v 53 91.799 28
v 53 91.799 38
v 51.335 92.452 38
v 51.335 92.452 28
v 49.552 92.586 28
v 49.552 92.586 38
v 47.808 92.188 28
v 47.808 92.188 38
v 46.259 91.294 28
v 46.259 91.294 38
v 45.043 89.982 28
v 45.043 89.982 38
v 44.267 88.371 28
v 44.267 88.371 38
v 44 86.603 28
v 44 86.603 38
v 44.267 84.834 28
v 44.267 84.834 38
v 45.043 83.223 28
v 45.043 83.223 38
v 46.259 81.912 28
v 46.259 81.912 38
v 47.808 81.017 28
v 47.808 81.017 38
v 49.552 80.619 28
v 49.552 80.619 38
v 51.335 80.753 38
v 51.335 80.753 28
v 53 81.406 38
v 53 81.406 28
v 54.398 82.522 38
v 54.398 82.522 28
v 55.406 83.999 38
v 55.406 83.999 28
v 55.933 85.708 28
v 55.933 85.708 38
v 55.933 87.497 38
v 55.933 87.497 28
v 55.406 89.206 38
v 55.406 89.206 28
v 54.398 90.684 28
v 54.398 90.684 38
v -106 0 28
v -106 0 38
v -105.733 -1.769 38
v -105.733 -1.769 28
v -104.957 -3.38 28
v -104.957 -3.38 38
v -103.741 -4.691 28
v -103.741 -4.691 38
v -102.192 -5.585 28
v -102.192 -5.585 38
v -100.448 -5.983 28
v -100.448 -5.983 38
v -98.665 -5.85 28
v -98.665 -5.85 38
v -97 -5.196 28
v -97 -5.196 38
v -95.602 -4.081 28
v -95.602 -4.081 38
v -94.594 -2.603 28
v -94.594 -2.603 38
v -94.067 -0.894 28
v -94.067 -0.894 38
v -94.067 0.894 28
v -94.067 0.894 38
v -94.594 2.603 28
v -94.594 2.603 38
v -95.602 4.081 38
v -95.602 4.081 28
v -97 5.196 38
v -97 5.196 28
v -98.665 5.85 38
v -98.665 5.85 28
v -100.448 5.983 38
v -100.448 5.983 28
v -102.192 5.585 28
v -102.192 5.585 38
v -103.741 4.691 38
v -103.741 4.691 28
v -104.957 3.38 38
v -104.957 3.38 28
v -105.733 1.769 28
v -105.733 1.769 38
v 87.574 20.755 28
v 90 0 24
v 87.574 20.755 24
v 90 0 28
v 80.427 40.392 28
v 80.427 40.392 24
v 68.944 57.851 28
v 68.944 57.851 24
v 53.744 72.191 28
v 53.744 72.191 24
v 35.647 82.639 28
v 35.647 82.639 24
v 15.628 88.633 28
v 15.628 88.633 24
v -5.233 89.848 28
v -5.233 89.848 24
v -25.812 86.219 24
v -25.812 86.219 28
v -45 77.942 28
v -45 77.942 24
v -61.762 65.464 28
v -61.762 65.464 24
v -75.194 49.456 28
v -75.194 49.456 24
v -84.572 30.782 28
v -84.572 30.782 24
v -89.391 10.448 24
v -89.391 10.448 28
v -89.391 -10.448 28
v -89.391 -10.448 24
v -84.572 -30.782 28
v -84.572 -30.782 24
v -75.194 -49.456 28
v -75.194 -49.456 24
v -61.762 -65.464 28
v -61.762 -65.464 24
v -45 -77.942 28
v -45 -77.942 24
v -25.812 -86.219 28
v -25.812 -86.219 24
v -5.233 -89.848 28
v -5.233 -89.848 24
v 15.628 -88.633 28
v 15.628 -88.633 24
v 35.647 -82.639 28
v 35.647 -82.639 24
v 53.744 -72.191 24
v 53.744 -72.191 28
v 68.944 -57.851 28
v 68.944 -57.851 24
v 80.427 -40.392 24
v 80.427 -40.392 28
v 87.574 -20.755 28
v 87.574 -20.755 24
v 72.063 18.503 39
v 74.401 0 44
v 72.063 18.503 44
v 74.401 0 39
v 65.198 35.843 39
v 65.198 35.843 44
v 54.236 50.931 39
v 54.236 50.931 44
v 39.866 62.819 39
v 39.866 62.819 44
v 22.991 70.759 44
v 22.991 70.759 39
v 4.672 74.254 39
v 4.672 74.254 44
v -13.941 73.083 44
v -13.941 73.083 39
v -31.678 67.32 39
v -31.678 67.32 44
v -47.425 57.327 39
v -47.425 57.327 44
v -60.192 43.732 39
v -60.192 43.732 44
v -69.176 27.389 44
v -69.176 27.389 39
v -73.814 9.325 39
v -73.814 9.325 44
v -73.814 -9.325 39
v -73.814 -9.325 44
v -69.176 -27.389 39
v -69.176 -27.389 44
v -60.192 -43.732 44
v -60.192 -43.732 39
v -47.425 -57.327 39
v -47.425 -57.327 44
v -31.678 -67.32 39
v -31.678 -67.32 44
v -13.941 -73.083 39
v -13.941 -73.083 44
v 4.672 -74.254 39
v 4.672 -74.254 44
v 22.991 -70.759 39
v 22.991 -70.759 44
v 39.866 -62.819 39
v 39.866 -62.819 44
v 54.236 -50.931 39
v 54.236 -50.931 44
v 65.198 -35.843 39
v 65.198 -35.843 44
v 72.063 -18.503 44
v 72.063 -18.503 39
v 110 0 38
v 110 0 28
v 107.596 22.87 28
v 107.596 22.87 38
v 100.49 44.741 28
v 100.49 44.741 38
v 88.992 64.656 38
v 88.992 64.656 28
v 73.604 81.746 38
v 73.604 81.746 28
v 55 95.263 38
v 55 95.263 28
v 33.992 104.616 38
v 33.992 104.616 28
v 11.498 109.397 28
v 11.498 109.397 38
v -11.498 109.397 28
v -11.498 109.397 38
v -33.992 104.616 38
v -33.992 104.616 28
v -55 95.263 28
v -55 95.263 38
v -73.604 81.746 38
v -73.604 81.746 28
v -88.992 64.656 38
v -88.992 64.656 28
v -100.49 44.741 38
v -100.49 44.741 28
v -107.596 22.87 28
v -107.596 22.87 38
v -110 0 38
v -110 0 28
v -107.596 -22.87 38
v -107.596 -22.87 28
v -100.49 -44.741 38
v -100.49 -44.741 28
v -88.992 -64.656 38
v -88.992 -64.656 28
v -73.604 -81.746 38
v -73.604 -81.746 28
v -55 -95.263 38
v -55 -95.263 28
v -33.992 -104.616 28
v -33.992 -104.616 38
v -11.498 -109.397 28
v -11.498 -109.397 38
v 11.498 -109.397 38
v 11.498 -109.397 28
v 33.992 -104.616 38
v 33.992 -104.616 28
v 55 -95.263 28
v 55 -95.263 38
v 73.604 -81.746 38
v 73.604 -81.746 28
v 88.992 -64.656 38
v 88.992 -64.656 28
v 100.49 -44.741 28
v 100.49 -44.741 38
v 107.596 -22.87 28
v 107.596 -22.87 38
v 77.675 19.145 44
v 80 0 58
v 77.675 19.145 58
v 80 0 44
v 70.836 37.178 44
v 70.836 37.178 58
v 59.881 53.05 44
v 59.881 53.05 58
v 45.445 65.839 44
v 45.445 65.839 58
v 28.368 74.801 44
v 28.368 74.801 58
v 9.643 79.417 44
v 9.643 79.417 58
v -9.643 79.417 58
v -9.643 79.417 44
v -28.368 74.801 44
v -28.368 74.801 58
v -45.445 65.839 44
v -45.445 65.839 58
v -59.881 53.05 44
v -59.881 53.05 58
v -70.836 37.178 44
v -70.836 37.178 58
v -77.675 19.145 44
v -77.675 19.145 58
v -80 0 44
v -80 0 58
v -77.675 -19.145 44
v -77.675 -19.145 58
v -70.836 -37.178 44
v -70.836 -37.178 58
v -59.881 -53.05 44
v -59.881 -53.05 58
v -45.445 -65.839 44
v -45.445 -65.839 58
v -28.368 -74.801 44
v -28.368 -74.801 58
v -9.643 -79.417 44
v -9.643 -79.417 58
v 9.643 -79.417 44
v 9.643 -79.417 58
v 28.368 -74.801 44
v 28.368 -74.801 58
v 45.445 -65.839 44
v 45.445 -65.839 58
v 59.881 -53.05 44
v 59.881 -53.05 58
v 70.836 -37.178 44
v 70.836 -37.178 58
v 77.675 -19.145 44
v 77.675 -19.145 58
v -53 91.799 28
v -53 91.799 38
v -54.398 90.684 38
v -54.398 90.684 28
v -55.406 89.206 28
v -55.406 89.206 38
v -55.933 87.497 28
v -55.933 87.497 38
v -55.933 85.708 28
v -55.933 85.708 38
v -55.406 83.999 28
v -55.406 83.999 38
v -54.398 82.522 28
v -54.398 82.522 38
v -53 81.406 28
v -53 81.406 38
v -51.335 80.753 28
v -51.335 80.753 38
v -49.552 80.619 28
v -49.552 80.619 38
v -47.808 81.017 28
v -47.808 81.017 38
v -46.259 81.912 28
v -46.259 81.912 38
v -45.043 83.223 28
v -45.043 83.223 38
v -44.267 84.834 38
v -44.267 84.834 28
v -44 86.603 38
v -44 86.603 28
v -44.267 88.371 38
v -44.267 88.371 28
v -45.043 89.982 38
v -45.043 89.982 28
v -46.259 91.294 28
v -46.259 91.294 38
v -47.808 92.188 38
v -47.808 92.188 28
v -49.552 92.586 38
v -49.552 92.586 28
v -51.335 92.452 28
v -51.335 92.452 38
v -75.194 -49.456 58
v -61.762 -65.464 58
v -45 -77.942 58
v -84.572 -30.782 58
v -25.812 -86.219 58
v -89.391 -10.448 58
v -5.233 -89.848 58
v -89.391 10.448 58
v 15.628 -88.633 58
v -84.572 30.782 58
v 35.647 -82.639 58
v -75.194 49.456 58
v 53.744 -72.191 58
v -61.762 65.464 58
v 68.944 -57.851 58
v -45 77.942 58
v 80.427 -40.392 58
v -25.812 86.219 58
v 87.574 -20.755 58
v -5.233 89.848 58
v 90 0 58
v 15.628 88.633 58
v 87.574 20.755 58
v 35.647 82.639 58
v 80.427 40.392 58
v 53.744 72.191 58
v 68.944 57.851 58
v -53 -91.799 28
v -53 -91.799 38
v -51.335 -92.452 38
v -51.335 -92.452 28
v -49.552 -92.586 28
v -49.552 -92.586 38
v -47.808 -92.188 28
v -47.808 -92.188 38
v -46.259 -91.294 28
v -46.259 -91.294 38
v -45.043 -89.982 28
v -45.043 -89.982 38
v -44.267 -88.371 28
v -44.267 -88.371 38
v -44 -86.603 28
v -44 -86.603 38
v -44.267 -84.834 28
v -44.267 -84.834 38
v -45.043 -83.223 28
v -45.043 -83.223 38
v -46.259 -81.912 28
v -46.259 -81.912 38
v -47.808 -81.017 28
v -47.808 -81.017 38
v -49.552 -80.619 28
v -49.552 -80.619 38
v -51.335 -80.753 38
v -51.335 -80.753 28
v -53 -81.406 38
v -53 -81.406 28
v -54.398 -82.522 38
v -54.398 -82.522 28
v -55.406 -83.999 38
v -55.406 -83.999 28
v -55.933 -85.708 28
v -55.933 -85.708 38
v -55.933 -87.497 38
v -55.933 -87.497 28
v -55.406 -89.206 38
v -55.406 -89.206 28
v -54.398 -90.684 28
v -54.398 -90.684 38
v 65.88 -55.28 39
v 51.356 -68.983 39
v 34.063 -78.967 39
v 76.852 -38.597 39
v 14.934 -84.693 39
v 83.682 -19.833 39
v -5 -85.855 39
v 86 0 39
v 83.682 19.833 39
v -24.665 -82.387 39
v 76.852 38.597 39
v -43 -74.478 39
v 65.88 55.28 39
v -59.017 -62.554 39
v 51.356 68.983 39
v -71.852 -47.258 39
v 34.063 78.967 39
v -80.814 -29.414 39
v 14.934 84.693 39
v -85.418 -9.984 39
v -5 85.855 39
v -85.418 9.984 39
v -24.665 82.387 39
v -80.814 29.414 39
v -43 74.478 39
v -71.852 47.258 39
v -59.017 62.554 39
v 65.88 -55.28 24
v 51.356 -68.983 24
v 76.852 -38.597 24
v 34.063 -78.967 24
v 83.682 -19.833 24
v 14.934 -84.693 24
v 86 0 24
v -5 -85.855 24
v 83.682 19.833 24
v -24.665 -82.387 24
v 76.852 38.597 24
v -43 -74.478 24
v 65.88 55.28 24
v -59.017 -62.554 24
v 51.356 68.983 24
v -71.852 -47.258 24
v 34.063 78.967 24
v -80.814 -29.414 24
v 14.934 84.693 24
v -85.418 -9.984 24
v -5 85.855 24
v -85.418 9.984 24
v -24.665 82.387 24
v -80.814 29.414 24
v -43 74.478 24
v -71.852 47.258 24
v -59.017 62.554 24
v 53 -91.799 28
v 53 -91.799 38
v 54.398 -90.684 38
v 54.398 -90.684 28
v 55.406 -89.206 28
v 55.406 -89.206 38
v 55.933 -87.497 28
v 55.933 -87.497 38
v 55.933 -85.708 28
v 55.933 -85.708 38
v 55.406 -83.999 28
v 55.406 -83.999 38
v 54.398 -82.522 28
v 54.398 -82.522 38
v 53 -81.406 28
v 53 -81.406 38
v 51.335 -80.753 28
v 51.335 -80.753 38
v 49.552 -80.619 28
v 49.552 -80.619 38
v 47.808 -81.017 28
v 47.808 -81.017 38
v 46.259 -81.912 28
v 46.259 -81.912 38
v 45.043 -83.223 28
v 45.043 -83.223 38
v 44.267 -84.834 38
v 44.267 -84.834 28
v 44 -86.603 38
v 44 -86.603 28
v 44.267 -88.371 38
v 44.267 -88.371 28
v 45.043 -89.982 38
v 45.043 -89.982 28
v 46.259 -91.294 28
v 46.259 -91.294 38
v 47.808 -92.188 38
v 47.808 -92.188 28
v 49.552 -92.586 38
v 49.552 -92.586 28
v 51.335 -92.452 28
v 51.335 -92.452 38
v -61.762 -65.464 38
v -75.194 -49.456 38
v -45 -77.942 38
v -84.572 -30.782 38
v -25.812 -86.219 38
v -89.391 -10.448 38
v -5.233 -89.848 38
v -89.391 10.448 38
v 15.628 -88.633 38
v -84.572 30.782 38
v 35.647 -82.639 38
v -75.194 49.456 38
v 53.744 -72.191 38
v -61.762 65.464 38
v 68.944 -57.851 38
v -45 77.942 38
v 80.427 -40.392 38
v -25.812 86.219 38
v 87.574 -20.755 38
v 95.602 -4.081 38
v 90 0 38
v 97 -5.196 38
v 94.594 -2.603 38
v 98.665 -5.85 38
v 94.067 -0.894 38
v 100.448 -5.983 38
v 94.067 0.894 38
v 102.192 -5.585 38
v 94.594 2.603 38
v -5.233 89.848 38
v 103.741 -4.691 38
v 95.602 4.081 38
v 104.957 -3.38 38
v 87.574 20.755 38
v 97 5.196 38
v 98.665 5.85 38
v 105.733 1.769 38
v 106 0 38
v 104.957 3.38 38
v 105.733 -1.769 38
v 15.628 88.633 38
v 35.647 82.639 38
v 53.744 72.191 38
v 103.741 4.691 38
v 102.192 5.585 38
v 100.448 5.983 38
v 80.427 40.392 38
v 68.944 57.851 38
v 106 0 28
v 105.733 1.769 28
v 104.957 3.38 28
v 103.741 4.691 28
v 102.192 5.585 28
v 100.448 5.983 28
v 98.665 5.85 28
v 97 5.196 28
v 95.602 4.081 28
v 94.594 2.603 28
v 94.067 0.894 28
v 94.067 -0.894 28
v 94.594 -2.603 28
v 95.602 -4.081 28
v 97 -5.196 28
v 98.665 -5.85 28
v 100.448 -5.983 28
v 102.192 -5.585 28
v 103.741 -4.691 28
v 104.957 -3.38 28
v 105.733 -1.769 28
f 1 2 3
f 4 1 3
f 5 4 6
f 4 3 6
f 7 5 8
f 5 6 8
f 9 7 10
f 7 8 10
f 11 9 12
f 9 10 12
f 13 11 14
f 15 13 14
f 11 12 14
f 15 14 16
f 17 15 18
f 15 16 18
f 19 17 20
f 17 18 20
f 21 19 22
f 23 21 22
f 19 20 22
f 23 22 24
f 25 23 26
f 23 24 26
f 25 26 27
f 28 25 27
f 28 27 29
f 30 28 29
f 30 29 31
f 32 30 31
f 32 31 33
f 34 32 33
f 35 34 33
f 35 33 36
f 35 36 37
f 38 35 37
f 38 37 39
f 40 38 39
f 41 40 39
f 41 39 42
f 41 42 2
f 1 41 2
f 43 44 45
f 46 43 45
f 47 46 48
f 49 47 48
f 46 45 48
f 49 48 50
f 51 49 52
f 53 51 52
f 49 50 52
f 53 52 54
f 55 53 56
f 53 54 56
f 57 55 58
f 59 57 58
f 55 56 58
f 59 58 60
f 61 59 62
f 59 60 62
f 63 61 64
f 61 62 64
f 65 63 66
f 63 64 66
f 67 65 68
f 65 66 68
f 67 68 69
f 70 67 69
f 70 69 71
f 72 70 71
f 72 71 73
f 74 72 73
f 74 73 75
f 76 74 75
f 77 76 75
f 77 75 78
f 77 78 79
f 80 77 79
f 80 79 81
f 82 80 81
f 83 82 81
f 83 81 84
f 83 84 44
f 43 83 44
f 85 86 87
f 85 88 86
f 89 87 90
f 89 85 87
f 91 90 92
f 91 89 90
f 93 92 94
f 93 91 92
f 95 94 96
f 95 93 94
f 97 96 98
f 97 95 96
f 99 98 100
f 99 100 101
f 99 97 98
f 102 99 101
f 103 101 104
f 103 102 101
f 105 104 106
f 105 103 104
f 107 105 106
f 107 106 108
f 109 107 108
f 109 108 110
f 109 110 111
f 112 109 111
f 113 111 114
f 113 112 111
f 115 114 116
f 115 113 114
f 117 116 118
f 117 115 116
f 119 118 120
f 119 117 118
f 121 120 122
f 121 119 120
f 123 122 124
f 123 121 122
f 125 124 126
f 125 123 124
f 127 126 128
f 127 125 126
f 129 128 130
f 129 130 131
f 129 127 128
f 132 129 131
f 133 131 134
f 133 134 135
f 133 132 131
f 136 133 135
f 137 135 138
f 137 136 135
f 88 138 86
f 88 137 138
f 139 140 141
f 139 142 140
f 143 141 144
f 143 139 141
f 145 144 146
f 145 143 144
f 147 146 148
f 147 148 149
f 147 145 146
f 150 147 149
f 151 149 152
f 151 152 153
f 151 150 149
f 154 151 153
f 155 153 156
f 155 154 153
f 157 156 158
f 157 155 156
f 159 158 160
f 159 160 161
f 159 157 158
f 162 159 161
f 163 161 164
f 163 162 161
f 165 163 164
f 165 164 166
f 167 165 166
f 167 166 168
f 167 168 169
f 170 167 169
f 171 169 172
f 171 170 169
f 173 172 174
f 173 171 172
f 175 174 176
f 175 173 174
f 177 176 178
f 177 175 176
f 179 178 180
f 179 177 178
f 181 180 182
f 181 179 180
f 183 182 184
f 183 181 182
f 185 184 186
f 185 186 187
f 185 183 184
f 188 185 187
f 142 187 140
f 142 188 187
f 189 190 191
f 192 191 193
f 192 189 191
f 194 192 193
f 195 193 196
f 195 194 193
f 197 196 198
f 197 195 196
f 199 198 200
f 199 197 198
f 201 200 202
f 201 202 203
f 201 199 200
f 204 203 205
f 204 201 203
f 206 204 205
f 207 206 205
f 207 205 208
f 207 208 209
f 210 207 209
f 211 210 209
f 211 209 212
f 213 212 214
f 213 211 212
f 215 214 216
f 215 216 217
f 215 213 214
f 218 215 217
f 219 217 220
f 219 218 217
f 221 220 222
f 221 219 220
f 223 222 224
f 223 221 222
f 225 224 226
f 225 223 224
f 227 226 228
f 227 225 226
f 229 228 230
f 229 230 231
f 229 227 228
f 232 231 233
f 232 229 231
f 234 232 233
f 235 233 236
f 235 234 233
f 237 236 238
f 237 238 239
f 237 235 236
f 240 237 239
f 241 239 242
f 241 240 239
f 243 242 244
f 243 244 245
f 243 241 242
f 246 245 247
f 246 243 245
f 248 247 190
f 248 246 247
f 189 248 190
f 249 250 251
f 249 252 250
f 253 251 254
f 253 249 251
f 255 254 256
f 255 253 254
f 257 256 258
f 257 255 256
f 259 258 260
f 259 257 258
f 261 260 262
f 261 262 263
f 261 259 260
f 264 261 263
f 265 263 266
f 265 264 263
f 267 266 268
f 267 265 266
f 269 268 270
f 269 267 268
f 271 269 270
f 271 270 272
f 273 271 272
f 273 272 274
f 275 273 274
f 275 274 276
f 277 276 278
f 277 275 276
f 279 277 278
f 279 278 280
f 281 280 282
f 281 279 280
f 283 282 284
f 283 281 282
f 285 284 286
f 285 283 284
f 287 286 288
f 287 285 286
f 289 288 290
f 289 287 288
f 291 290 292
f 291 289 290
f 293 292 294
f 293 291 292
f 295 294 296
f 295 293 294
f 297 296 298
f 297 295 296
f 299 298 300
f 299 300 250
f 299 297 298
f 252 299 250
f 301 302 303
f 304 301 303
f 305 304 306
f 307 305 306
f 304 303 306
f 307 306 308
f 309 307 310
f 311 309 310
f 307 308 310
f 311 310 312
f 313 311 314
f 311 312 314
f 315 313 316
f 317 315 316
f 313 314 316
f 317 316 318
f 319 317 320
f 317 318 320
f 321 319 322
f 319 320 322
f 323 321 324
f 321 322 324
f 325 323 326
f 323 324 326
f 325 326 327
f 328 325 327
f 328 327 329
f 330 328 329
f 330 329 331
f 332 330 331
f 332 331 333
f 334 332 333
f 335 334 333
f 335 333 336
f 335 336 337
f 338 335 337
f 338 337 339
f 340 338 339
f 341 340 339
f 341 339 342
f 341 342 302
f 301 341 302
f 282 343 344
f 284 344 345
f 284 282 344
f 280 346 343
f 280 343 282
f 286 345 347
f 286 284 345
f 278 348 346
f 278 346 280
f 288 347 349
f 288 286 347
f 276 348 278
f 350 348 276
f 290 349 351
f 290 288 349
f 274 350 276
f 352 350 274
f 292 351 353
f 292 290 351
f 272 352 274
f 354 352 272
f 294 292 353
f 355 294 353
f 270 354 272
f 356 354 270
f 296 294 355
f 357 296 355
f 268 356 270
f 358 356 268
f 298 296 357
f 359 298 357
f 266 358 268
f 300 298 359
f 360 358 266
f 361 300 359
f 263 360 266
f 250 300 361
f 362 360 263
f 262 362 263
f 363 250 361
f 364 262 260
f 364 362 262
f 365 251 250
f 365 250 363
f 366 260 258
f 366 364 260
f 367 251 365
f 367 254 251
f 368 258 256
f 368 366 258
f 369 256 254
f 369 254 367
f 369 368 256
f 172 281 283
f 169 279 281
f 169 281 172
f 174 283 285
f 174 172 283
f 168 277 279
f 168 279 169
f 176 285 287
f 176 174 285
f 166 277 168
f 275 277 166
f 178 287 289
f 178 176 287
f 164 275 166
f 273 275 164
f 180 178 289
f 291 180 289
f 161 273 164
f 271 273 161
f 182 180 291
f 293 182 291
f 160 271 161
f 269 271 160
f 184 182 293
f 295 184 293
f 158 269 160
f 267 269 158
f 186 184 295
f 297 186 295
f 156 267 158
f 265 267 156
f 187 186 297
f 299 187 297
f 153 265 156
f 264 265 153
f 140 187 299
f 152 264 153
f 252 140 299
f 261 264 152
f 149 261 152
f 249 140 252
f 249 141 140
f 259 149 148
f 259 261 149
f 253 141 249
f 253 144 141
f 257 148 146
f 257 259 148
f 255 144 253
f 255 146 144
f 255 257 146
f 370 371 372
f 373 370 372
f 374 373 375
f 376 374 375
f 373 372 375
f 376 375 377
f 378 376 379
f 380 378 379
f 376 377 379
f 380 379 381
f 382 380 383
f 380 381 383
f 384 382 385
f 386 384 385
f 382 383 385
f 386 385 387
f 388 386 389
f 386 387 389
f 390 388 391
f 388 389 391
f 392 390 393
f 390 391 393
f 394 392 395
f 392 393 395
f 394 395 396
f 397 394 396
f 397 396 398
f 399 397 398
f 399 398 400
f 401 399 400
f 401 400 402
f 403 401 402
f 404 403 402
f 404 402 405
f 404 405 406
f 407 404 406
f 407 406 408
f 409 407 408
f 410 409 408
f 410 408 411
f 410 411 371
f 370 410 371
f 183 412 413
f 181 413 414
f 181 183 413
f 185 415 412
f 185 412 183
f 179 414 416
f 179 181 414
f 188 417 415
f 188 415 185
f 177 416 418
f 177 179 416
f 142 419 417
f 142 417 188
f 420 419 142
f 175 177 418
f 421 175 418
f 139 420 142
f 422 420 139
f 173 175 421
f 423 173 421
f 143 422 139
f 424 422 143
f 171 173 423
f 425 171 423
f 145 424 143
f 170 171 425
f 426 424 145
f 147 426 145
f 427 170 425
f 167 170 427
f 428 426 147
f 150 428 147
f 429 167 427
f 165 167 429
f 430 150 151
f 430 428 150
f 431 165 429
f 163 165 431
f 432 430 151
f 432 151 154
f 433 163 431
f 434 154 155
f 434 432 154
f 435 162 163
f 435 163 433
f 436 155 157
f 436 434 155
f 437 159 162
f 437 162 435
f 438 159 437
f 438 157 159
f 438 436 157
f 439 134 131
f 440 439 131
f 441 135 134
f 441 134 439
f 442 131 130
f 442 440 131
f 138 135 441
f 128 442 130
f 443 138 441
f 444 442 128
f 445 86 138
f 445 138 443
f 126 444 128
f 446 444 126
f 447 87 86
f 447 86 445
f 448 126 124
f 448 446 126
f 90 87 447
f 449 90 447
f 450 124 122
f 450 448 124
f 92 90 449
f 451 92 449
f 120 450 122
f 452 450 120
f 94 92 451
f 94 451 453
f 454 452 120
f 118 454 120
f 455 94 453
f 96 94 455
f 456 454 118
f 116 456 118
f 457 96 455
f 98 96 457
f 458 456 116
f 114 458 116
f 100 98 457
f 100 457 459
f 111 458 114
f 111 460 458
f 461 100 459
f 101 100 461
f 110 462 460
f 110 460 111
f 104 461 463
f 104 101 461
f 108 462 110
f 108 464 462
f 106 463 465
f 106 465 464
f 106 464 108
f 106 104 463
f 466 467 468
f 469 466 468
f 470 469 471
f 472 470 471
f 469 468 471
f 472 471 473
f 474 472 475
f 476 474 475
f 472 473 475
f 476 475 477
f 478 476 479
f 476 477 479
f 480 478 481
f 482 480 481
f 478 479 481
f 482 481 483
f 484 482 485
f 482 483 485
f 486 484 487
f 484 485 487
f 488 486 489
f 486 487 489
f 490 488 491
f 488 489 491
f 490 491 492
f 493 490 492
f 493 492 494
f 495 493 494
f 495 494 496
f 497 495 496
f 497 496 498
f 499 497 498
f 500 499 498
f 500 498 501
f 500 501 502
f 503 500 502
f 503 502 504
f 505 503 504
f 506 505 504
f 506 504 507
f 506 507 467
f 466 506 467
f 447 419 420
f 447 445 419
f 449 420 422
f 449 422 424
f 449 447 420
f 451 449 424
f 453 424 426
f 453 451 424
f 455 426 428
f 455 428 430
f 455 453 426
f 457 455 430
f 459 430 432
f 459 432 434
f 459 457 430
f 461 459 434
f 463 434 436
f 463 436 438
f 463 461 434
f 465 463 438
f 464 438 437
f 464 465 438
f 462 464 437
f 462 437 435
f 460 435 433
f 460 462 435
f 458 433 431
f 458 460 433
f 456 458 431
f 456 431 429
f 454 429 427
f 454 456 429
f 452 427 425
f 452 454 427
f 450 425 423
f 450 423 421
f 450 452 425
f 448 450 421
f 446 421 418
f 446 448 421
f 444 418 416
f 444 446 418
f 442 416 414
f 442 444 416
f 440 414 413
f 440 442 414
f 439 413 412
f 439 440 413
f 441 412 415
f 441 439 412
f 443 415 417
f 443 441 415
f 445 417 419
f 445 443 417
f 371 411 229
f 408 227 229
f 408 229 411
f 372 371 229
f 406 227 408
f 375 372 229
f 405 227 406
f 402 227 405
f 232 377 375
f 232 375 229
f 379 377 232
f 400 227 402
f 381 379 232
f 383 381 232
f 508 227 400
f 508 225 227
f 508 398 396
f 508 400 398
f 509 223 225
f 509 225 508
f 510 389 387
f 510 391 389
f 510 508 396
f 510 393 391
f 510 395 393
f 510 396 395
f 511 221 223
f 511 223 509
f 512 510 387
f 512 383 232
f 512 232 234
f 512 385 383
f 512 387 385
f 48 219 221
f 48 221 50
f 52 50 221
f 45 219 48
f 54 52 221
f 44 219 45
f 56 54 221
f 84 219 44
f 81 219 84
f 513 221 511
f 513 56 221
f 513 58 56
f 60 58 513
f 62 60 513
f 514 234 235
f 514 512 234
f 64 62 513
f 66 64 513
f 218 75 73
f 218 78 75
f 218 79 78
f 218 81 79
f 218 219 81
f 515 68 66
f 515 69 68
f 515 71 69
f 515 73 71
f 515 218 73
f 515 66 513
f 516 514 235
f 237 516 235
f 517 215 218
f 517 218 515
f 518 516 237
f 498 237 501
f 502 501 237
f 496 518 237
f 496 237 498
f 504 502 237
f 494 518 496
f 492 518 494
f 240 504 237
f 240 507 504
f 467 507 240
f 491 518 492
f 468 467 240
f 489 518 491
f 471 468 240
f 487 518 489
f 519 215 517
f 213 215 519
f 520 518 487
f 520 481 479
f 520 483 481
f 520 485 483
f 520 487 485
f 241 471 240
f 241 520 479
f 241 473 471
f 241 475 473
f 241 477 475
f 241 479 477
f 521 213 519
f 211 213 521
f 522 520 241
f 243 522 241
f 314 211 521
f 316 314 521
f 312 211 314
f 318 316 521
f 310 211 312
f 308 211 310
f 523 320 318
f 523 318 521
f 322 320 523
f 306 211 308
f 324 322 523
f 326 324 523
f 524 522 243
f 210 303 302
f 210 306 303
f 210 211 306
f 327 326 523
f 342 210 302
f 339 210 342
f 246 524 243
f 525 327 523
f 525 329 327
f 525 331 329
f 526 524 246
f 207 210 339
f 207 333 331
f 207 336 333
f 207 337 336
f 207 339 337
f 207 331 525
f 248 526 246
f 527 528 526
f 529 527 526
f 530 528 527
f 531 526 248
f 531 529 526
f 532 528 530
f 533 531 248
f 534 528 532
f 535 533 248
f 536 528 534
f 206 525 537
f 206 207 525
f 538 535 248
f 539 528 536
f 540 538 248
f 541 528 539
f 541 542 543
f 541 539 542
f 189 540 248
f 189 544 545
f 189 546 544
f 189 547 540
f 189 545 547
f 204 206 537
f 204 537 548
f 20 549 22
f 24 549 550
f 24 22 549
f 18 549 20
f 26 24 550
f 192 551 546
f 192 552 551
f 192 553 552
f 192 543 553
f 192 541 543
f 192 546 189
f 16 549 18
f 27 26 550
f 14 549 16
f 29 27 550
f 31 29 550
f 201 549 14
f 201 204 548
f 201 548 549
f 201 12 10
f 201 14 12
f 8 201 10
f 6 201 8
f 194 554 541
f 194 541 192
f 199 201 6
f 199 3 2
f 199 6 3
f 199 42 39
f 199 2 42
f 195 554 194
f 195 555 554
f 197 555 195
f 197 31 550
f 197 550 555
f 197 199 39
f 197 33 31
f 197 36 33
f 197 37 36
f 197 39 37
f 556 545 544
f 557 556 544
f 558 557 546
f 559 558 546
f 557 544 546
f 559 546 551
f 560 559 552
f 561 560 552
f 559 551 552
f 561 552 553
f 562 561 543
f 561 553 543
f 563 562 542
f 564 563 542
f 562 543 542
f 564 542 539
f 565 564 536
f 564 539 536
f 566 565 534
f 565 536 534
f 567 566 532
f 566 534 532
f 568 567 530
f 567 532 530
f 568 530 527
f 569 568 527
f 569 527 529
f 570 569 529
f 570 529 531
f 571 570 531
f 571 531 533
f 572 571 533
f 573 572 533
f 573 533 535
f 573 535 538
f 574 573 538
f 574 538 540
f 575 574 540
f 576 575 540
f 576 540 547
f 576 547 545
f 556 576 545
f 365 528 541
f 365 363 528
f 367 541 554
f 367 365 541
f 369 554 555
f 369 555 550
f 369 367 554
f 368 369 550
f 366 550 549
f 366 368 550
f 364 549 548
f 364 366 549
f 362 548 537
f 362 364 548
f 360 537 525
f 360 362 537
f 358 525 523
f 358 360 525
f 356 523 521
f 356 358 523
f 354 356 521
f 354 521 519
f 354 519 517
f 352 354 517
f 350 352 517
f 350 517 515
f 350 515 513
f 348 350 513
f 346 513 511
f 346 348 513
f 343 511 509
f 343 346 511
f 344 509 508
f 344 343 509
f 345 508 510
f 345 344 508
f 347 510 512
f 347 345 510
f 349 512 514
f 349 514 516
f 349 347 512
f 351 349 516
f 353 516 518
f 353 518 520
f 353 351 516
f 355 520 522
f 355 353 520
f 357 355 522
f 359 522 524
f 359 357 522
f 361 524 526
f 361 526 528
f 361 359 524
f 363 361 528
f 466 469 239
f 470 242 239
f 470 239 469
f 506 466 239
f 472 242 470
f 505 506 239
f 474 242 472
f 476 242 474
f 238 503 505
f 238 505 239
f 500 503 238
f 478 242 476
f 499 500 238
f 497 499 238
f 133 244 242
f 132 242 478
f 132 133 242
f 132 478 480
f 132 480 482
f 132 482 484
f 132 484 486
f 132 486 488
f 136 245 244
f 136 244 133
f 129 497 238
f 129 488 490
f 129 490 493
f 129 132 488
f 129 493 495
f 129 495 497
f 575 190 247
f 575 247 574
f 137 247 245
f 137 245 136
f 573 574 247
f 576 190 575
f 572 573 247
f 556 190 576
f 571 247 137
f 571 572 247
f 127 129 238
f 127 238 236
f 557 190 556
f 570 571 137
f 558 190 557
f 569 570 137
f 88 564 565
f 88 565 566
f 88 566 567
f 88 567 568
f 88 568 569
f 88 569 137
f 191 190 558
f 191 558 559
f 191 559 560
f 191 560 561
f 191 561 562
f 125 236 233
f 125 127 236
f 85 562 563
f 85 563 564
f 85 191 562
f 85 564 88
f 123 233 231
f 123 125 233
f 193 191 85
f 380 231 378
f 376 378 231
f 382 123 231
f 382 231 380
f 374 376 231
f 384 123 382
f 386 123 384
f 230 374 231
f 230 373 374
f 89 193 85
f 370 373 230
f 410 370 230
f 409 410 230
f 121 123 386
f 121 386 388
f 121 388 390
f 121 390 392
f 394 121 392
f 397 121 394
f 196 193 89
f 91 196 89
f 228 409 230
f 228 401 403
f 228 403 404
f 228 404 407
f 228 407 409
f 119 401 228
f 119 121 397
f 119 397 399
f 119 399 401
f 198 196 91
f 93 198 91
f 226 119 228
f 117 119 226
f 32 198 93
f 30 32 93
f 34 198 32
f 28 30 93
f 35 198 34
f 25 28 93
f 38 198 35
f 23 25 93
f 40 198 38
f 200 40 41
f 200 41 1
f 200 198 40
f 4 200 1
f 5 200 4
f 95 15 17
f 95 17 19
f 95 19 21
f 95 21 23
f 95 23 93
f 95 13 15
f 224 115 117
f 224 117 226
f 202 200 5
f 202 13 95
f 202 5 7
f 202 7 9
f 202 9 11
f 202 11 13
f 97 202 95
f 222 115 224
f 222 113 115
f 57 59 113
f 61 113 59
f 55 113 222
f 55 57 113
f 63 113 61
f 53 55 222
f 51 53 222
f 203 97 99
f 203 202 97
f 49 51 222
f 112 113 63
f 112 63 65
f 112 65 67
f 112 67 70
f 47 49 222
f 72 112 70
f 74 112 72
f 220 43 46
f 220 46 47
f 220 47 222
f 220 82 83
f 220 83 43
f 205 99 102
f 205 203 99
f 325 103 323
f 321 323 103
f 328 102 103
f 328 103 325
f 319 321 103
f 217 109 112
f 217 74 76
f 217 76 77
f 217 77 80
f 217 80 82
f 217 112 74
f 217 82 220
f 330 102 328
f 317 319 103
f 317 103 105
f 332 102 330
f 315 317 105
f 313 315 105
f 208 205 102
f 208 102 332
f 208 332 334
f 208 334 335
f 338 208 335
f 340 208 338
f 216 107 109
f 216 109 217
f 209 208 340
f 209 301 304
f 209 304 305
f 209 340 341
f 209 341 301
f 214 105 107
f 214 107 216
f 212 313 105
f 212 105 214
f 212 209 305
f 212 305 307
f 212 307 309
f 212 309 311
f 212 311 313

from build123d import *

# Parameters (mm, degrees)
SKETCH004_R        = 6
POCKET_DEPTH       = 639.959465
POLARPATTERN_COUNT = 6


with BuildPart() as part:
    # Sketch002 → Revolution003 (revolve)
    with BuildSketch(Plane.XZ):
        Polygon((90, 28), (110, 28), (110, 38), (90, 38), (90, 58), (80, 58), (80, 44), (74.400894, 44), (74.400894, 39), (86, 39), (86, 24), (90, 24), align=None)
    revolve(axis=Axis((0, 0, 0), (0, 0, 1)))

    # Sketch004 (on Face8 of Revolution003) → Pocket (cut, through all)
    with BuildSketch(Plane(origin=(0, 0, 38), x_dir=(-1, 0, 0), z_dir=(0, 0, 1))):
        with Locations((100, 0)):
            Circle(SKETCH004_R)
    pocket = extrude(amount=-POCKET_DEPTH, mode=Mode.SUBTRACT)

    # PolarPattern: Pocket ×6 about axis
    polarpattern_axis = Axis((0, 0, 38), (0, 0, 1))
    for i in range(1, POLARPATTERN_COUNT):
        add(pocket.rotate(polarpattern_axis, i * 360 / POLARPATTERN_COUNT), mode=Mode.SUBTRACT)


solid = part.part
